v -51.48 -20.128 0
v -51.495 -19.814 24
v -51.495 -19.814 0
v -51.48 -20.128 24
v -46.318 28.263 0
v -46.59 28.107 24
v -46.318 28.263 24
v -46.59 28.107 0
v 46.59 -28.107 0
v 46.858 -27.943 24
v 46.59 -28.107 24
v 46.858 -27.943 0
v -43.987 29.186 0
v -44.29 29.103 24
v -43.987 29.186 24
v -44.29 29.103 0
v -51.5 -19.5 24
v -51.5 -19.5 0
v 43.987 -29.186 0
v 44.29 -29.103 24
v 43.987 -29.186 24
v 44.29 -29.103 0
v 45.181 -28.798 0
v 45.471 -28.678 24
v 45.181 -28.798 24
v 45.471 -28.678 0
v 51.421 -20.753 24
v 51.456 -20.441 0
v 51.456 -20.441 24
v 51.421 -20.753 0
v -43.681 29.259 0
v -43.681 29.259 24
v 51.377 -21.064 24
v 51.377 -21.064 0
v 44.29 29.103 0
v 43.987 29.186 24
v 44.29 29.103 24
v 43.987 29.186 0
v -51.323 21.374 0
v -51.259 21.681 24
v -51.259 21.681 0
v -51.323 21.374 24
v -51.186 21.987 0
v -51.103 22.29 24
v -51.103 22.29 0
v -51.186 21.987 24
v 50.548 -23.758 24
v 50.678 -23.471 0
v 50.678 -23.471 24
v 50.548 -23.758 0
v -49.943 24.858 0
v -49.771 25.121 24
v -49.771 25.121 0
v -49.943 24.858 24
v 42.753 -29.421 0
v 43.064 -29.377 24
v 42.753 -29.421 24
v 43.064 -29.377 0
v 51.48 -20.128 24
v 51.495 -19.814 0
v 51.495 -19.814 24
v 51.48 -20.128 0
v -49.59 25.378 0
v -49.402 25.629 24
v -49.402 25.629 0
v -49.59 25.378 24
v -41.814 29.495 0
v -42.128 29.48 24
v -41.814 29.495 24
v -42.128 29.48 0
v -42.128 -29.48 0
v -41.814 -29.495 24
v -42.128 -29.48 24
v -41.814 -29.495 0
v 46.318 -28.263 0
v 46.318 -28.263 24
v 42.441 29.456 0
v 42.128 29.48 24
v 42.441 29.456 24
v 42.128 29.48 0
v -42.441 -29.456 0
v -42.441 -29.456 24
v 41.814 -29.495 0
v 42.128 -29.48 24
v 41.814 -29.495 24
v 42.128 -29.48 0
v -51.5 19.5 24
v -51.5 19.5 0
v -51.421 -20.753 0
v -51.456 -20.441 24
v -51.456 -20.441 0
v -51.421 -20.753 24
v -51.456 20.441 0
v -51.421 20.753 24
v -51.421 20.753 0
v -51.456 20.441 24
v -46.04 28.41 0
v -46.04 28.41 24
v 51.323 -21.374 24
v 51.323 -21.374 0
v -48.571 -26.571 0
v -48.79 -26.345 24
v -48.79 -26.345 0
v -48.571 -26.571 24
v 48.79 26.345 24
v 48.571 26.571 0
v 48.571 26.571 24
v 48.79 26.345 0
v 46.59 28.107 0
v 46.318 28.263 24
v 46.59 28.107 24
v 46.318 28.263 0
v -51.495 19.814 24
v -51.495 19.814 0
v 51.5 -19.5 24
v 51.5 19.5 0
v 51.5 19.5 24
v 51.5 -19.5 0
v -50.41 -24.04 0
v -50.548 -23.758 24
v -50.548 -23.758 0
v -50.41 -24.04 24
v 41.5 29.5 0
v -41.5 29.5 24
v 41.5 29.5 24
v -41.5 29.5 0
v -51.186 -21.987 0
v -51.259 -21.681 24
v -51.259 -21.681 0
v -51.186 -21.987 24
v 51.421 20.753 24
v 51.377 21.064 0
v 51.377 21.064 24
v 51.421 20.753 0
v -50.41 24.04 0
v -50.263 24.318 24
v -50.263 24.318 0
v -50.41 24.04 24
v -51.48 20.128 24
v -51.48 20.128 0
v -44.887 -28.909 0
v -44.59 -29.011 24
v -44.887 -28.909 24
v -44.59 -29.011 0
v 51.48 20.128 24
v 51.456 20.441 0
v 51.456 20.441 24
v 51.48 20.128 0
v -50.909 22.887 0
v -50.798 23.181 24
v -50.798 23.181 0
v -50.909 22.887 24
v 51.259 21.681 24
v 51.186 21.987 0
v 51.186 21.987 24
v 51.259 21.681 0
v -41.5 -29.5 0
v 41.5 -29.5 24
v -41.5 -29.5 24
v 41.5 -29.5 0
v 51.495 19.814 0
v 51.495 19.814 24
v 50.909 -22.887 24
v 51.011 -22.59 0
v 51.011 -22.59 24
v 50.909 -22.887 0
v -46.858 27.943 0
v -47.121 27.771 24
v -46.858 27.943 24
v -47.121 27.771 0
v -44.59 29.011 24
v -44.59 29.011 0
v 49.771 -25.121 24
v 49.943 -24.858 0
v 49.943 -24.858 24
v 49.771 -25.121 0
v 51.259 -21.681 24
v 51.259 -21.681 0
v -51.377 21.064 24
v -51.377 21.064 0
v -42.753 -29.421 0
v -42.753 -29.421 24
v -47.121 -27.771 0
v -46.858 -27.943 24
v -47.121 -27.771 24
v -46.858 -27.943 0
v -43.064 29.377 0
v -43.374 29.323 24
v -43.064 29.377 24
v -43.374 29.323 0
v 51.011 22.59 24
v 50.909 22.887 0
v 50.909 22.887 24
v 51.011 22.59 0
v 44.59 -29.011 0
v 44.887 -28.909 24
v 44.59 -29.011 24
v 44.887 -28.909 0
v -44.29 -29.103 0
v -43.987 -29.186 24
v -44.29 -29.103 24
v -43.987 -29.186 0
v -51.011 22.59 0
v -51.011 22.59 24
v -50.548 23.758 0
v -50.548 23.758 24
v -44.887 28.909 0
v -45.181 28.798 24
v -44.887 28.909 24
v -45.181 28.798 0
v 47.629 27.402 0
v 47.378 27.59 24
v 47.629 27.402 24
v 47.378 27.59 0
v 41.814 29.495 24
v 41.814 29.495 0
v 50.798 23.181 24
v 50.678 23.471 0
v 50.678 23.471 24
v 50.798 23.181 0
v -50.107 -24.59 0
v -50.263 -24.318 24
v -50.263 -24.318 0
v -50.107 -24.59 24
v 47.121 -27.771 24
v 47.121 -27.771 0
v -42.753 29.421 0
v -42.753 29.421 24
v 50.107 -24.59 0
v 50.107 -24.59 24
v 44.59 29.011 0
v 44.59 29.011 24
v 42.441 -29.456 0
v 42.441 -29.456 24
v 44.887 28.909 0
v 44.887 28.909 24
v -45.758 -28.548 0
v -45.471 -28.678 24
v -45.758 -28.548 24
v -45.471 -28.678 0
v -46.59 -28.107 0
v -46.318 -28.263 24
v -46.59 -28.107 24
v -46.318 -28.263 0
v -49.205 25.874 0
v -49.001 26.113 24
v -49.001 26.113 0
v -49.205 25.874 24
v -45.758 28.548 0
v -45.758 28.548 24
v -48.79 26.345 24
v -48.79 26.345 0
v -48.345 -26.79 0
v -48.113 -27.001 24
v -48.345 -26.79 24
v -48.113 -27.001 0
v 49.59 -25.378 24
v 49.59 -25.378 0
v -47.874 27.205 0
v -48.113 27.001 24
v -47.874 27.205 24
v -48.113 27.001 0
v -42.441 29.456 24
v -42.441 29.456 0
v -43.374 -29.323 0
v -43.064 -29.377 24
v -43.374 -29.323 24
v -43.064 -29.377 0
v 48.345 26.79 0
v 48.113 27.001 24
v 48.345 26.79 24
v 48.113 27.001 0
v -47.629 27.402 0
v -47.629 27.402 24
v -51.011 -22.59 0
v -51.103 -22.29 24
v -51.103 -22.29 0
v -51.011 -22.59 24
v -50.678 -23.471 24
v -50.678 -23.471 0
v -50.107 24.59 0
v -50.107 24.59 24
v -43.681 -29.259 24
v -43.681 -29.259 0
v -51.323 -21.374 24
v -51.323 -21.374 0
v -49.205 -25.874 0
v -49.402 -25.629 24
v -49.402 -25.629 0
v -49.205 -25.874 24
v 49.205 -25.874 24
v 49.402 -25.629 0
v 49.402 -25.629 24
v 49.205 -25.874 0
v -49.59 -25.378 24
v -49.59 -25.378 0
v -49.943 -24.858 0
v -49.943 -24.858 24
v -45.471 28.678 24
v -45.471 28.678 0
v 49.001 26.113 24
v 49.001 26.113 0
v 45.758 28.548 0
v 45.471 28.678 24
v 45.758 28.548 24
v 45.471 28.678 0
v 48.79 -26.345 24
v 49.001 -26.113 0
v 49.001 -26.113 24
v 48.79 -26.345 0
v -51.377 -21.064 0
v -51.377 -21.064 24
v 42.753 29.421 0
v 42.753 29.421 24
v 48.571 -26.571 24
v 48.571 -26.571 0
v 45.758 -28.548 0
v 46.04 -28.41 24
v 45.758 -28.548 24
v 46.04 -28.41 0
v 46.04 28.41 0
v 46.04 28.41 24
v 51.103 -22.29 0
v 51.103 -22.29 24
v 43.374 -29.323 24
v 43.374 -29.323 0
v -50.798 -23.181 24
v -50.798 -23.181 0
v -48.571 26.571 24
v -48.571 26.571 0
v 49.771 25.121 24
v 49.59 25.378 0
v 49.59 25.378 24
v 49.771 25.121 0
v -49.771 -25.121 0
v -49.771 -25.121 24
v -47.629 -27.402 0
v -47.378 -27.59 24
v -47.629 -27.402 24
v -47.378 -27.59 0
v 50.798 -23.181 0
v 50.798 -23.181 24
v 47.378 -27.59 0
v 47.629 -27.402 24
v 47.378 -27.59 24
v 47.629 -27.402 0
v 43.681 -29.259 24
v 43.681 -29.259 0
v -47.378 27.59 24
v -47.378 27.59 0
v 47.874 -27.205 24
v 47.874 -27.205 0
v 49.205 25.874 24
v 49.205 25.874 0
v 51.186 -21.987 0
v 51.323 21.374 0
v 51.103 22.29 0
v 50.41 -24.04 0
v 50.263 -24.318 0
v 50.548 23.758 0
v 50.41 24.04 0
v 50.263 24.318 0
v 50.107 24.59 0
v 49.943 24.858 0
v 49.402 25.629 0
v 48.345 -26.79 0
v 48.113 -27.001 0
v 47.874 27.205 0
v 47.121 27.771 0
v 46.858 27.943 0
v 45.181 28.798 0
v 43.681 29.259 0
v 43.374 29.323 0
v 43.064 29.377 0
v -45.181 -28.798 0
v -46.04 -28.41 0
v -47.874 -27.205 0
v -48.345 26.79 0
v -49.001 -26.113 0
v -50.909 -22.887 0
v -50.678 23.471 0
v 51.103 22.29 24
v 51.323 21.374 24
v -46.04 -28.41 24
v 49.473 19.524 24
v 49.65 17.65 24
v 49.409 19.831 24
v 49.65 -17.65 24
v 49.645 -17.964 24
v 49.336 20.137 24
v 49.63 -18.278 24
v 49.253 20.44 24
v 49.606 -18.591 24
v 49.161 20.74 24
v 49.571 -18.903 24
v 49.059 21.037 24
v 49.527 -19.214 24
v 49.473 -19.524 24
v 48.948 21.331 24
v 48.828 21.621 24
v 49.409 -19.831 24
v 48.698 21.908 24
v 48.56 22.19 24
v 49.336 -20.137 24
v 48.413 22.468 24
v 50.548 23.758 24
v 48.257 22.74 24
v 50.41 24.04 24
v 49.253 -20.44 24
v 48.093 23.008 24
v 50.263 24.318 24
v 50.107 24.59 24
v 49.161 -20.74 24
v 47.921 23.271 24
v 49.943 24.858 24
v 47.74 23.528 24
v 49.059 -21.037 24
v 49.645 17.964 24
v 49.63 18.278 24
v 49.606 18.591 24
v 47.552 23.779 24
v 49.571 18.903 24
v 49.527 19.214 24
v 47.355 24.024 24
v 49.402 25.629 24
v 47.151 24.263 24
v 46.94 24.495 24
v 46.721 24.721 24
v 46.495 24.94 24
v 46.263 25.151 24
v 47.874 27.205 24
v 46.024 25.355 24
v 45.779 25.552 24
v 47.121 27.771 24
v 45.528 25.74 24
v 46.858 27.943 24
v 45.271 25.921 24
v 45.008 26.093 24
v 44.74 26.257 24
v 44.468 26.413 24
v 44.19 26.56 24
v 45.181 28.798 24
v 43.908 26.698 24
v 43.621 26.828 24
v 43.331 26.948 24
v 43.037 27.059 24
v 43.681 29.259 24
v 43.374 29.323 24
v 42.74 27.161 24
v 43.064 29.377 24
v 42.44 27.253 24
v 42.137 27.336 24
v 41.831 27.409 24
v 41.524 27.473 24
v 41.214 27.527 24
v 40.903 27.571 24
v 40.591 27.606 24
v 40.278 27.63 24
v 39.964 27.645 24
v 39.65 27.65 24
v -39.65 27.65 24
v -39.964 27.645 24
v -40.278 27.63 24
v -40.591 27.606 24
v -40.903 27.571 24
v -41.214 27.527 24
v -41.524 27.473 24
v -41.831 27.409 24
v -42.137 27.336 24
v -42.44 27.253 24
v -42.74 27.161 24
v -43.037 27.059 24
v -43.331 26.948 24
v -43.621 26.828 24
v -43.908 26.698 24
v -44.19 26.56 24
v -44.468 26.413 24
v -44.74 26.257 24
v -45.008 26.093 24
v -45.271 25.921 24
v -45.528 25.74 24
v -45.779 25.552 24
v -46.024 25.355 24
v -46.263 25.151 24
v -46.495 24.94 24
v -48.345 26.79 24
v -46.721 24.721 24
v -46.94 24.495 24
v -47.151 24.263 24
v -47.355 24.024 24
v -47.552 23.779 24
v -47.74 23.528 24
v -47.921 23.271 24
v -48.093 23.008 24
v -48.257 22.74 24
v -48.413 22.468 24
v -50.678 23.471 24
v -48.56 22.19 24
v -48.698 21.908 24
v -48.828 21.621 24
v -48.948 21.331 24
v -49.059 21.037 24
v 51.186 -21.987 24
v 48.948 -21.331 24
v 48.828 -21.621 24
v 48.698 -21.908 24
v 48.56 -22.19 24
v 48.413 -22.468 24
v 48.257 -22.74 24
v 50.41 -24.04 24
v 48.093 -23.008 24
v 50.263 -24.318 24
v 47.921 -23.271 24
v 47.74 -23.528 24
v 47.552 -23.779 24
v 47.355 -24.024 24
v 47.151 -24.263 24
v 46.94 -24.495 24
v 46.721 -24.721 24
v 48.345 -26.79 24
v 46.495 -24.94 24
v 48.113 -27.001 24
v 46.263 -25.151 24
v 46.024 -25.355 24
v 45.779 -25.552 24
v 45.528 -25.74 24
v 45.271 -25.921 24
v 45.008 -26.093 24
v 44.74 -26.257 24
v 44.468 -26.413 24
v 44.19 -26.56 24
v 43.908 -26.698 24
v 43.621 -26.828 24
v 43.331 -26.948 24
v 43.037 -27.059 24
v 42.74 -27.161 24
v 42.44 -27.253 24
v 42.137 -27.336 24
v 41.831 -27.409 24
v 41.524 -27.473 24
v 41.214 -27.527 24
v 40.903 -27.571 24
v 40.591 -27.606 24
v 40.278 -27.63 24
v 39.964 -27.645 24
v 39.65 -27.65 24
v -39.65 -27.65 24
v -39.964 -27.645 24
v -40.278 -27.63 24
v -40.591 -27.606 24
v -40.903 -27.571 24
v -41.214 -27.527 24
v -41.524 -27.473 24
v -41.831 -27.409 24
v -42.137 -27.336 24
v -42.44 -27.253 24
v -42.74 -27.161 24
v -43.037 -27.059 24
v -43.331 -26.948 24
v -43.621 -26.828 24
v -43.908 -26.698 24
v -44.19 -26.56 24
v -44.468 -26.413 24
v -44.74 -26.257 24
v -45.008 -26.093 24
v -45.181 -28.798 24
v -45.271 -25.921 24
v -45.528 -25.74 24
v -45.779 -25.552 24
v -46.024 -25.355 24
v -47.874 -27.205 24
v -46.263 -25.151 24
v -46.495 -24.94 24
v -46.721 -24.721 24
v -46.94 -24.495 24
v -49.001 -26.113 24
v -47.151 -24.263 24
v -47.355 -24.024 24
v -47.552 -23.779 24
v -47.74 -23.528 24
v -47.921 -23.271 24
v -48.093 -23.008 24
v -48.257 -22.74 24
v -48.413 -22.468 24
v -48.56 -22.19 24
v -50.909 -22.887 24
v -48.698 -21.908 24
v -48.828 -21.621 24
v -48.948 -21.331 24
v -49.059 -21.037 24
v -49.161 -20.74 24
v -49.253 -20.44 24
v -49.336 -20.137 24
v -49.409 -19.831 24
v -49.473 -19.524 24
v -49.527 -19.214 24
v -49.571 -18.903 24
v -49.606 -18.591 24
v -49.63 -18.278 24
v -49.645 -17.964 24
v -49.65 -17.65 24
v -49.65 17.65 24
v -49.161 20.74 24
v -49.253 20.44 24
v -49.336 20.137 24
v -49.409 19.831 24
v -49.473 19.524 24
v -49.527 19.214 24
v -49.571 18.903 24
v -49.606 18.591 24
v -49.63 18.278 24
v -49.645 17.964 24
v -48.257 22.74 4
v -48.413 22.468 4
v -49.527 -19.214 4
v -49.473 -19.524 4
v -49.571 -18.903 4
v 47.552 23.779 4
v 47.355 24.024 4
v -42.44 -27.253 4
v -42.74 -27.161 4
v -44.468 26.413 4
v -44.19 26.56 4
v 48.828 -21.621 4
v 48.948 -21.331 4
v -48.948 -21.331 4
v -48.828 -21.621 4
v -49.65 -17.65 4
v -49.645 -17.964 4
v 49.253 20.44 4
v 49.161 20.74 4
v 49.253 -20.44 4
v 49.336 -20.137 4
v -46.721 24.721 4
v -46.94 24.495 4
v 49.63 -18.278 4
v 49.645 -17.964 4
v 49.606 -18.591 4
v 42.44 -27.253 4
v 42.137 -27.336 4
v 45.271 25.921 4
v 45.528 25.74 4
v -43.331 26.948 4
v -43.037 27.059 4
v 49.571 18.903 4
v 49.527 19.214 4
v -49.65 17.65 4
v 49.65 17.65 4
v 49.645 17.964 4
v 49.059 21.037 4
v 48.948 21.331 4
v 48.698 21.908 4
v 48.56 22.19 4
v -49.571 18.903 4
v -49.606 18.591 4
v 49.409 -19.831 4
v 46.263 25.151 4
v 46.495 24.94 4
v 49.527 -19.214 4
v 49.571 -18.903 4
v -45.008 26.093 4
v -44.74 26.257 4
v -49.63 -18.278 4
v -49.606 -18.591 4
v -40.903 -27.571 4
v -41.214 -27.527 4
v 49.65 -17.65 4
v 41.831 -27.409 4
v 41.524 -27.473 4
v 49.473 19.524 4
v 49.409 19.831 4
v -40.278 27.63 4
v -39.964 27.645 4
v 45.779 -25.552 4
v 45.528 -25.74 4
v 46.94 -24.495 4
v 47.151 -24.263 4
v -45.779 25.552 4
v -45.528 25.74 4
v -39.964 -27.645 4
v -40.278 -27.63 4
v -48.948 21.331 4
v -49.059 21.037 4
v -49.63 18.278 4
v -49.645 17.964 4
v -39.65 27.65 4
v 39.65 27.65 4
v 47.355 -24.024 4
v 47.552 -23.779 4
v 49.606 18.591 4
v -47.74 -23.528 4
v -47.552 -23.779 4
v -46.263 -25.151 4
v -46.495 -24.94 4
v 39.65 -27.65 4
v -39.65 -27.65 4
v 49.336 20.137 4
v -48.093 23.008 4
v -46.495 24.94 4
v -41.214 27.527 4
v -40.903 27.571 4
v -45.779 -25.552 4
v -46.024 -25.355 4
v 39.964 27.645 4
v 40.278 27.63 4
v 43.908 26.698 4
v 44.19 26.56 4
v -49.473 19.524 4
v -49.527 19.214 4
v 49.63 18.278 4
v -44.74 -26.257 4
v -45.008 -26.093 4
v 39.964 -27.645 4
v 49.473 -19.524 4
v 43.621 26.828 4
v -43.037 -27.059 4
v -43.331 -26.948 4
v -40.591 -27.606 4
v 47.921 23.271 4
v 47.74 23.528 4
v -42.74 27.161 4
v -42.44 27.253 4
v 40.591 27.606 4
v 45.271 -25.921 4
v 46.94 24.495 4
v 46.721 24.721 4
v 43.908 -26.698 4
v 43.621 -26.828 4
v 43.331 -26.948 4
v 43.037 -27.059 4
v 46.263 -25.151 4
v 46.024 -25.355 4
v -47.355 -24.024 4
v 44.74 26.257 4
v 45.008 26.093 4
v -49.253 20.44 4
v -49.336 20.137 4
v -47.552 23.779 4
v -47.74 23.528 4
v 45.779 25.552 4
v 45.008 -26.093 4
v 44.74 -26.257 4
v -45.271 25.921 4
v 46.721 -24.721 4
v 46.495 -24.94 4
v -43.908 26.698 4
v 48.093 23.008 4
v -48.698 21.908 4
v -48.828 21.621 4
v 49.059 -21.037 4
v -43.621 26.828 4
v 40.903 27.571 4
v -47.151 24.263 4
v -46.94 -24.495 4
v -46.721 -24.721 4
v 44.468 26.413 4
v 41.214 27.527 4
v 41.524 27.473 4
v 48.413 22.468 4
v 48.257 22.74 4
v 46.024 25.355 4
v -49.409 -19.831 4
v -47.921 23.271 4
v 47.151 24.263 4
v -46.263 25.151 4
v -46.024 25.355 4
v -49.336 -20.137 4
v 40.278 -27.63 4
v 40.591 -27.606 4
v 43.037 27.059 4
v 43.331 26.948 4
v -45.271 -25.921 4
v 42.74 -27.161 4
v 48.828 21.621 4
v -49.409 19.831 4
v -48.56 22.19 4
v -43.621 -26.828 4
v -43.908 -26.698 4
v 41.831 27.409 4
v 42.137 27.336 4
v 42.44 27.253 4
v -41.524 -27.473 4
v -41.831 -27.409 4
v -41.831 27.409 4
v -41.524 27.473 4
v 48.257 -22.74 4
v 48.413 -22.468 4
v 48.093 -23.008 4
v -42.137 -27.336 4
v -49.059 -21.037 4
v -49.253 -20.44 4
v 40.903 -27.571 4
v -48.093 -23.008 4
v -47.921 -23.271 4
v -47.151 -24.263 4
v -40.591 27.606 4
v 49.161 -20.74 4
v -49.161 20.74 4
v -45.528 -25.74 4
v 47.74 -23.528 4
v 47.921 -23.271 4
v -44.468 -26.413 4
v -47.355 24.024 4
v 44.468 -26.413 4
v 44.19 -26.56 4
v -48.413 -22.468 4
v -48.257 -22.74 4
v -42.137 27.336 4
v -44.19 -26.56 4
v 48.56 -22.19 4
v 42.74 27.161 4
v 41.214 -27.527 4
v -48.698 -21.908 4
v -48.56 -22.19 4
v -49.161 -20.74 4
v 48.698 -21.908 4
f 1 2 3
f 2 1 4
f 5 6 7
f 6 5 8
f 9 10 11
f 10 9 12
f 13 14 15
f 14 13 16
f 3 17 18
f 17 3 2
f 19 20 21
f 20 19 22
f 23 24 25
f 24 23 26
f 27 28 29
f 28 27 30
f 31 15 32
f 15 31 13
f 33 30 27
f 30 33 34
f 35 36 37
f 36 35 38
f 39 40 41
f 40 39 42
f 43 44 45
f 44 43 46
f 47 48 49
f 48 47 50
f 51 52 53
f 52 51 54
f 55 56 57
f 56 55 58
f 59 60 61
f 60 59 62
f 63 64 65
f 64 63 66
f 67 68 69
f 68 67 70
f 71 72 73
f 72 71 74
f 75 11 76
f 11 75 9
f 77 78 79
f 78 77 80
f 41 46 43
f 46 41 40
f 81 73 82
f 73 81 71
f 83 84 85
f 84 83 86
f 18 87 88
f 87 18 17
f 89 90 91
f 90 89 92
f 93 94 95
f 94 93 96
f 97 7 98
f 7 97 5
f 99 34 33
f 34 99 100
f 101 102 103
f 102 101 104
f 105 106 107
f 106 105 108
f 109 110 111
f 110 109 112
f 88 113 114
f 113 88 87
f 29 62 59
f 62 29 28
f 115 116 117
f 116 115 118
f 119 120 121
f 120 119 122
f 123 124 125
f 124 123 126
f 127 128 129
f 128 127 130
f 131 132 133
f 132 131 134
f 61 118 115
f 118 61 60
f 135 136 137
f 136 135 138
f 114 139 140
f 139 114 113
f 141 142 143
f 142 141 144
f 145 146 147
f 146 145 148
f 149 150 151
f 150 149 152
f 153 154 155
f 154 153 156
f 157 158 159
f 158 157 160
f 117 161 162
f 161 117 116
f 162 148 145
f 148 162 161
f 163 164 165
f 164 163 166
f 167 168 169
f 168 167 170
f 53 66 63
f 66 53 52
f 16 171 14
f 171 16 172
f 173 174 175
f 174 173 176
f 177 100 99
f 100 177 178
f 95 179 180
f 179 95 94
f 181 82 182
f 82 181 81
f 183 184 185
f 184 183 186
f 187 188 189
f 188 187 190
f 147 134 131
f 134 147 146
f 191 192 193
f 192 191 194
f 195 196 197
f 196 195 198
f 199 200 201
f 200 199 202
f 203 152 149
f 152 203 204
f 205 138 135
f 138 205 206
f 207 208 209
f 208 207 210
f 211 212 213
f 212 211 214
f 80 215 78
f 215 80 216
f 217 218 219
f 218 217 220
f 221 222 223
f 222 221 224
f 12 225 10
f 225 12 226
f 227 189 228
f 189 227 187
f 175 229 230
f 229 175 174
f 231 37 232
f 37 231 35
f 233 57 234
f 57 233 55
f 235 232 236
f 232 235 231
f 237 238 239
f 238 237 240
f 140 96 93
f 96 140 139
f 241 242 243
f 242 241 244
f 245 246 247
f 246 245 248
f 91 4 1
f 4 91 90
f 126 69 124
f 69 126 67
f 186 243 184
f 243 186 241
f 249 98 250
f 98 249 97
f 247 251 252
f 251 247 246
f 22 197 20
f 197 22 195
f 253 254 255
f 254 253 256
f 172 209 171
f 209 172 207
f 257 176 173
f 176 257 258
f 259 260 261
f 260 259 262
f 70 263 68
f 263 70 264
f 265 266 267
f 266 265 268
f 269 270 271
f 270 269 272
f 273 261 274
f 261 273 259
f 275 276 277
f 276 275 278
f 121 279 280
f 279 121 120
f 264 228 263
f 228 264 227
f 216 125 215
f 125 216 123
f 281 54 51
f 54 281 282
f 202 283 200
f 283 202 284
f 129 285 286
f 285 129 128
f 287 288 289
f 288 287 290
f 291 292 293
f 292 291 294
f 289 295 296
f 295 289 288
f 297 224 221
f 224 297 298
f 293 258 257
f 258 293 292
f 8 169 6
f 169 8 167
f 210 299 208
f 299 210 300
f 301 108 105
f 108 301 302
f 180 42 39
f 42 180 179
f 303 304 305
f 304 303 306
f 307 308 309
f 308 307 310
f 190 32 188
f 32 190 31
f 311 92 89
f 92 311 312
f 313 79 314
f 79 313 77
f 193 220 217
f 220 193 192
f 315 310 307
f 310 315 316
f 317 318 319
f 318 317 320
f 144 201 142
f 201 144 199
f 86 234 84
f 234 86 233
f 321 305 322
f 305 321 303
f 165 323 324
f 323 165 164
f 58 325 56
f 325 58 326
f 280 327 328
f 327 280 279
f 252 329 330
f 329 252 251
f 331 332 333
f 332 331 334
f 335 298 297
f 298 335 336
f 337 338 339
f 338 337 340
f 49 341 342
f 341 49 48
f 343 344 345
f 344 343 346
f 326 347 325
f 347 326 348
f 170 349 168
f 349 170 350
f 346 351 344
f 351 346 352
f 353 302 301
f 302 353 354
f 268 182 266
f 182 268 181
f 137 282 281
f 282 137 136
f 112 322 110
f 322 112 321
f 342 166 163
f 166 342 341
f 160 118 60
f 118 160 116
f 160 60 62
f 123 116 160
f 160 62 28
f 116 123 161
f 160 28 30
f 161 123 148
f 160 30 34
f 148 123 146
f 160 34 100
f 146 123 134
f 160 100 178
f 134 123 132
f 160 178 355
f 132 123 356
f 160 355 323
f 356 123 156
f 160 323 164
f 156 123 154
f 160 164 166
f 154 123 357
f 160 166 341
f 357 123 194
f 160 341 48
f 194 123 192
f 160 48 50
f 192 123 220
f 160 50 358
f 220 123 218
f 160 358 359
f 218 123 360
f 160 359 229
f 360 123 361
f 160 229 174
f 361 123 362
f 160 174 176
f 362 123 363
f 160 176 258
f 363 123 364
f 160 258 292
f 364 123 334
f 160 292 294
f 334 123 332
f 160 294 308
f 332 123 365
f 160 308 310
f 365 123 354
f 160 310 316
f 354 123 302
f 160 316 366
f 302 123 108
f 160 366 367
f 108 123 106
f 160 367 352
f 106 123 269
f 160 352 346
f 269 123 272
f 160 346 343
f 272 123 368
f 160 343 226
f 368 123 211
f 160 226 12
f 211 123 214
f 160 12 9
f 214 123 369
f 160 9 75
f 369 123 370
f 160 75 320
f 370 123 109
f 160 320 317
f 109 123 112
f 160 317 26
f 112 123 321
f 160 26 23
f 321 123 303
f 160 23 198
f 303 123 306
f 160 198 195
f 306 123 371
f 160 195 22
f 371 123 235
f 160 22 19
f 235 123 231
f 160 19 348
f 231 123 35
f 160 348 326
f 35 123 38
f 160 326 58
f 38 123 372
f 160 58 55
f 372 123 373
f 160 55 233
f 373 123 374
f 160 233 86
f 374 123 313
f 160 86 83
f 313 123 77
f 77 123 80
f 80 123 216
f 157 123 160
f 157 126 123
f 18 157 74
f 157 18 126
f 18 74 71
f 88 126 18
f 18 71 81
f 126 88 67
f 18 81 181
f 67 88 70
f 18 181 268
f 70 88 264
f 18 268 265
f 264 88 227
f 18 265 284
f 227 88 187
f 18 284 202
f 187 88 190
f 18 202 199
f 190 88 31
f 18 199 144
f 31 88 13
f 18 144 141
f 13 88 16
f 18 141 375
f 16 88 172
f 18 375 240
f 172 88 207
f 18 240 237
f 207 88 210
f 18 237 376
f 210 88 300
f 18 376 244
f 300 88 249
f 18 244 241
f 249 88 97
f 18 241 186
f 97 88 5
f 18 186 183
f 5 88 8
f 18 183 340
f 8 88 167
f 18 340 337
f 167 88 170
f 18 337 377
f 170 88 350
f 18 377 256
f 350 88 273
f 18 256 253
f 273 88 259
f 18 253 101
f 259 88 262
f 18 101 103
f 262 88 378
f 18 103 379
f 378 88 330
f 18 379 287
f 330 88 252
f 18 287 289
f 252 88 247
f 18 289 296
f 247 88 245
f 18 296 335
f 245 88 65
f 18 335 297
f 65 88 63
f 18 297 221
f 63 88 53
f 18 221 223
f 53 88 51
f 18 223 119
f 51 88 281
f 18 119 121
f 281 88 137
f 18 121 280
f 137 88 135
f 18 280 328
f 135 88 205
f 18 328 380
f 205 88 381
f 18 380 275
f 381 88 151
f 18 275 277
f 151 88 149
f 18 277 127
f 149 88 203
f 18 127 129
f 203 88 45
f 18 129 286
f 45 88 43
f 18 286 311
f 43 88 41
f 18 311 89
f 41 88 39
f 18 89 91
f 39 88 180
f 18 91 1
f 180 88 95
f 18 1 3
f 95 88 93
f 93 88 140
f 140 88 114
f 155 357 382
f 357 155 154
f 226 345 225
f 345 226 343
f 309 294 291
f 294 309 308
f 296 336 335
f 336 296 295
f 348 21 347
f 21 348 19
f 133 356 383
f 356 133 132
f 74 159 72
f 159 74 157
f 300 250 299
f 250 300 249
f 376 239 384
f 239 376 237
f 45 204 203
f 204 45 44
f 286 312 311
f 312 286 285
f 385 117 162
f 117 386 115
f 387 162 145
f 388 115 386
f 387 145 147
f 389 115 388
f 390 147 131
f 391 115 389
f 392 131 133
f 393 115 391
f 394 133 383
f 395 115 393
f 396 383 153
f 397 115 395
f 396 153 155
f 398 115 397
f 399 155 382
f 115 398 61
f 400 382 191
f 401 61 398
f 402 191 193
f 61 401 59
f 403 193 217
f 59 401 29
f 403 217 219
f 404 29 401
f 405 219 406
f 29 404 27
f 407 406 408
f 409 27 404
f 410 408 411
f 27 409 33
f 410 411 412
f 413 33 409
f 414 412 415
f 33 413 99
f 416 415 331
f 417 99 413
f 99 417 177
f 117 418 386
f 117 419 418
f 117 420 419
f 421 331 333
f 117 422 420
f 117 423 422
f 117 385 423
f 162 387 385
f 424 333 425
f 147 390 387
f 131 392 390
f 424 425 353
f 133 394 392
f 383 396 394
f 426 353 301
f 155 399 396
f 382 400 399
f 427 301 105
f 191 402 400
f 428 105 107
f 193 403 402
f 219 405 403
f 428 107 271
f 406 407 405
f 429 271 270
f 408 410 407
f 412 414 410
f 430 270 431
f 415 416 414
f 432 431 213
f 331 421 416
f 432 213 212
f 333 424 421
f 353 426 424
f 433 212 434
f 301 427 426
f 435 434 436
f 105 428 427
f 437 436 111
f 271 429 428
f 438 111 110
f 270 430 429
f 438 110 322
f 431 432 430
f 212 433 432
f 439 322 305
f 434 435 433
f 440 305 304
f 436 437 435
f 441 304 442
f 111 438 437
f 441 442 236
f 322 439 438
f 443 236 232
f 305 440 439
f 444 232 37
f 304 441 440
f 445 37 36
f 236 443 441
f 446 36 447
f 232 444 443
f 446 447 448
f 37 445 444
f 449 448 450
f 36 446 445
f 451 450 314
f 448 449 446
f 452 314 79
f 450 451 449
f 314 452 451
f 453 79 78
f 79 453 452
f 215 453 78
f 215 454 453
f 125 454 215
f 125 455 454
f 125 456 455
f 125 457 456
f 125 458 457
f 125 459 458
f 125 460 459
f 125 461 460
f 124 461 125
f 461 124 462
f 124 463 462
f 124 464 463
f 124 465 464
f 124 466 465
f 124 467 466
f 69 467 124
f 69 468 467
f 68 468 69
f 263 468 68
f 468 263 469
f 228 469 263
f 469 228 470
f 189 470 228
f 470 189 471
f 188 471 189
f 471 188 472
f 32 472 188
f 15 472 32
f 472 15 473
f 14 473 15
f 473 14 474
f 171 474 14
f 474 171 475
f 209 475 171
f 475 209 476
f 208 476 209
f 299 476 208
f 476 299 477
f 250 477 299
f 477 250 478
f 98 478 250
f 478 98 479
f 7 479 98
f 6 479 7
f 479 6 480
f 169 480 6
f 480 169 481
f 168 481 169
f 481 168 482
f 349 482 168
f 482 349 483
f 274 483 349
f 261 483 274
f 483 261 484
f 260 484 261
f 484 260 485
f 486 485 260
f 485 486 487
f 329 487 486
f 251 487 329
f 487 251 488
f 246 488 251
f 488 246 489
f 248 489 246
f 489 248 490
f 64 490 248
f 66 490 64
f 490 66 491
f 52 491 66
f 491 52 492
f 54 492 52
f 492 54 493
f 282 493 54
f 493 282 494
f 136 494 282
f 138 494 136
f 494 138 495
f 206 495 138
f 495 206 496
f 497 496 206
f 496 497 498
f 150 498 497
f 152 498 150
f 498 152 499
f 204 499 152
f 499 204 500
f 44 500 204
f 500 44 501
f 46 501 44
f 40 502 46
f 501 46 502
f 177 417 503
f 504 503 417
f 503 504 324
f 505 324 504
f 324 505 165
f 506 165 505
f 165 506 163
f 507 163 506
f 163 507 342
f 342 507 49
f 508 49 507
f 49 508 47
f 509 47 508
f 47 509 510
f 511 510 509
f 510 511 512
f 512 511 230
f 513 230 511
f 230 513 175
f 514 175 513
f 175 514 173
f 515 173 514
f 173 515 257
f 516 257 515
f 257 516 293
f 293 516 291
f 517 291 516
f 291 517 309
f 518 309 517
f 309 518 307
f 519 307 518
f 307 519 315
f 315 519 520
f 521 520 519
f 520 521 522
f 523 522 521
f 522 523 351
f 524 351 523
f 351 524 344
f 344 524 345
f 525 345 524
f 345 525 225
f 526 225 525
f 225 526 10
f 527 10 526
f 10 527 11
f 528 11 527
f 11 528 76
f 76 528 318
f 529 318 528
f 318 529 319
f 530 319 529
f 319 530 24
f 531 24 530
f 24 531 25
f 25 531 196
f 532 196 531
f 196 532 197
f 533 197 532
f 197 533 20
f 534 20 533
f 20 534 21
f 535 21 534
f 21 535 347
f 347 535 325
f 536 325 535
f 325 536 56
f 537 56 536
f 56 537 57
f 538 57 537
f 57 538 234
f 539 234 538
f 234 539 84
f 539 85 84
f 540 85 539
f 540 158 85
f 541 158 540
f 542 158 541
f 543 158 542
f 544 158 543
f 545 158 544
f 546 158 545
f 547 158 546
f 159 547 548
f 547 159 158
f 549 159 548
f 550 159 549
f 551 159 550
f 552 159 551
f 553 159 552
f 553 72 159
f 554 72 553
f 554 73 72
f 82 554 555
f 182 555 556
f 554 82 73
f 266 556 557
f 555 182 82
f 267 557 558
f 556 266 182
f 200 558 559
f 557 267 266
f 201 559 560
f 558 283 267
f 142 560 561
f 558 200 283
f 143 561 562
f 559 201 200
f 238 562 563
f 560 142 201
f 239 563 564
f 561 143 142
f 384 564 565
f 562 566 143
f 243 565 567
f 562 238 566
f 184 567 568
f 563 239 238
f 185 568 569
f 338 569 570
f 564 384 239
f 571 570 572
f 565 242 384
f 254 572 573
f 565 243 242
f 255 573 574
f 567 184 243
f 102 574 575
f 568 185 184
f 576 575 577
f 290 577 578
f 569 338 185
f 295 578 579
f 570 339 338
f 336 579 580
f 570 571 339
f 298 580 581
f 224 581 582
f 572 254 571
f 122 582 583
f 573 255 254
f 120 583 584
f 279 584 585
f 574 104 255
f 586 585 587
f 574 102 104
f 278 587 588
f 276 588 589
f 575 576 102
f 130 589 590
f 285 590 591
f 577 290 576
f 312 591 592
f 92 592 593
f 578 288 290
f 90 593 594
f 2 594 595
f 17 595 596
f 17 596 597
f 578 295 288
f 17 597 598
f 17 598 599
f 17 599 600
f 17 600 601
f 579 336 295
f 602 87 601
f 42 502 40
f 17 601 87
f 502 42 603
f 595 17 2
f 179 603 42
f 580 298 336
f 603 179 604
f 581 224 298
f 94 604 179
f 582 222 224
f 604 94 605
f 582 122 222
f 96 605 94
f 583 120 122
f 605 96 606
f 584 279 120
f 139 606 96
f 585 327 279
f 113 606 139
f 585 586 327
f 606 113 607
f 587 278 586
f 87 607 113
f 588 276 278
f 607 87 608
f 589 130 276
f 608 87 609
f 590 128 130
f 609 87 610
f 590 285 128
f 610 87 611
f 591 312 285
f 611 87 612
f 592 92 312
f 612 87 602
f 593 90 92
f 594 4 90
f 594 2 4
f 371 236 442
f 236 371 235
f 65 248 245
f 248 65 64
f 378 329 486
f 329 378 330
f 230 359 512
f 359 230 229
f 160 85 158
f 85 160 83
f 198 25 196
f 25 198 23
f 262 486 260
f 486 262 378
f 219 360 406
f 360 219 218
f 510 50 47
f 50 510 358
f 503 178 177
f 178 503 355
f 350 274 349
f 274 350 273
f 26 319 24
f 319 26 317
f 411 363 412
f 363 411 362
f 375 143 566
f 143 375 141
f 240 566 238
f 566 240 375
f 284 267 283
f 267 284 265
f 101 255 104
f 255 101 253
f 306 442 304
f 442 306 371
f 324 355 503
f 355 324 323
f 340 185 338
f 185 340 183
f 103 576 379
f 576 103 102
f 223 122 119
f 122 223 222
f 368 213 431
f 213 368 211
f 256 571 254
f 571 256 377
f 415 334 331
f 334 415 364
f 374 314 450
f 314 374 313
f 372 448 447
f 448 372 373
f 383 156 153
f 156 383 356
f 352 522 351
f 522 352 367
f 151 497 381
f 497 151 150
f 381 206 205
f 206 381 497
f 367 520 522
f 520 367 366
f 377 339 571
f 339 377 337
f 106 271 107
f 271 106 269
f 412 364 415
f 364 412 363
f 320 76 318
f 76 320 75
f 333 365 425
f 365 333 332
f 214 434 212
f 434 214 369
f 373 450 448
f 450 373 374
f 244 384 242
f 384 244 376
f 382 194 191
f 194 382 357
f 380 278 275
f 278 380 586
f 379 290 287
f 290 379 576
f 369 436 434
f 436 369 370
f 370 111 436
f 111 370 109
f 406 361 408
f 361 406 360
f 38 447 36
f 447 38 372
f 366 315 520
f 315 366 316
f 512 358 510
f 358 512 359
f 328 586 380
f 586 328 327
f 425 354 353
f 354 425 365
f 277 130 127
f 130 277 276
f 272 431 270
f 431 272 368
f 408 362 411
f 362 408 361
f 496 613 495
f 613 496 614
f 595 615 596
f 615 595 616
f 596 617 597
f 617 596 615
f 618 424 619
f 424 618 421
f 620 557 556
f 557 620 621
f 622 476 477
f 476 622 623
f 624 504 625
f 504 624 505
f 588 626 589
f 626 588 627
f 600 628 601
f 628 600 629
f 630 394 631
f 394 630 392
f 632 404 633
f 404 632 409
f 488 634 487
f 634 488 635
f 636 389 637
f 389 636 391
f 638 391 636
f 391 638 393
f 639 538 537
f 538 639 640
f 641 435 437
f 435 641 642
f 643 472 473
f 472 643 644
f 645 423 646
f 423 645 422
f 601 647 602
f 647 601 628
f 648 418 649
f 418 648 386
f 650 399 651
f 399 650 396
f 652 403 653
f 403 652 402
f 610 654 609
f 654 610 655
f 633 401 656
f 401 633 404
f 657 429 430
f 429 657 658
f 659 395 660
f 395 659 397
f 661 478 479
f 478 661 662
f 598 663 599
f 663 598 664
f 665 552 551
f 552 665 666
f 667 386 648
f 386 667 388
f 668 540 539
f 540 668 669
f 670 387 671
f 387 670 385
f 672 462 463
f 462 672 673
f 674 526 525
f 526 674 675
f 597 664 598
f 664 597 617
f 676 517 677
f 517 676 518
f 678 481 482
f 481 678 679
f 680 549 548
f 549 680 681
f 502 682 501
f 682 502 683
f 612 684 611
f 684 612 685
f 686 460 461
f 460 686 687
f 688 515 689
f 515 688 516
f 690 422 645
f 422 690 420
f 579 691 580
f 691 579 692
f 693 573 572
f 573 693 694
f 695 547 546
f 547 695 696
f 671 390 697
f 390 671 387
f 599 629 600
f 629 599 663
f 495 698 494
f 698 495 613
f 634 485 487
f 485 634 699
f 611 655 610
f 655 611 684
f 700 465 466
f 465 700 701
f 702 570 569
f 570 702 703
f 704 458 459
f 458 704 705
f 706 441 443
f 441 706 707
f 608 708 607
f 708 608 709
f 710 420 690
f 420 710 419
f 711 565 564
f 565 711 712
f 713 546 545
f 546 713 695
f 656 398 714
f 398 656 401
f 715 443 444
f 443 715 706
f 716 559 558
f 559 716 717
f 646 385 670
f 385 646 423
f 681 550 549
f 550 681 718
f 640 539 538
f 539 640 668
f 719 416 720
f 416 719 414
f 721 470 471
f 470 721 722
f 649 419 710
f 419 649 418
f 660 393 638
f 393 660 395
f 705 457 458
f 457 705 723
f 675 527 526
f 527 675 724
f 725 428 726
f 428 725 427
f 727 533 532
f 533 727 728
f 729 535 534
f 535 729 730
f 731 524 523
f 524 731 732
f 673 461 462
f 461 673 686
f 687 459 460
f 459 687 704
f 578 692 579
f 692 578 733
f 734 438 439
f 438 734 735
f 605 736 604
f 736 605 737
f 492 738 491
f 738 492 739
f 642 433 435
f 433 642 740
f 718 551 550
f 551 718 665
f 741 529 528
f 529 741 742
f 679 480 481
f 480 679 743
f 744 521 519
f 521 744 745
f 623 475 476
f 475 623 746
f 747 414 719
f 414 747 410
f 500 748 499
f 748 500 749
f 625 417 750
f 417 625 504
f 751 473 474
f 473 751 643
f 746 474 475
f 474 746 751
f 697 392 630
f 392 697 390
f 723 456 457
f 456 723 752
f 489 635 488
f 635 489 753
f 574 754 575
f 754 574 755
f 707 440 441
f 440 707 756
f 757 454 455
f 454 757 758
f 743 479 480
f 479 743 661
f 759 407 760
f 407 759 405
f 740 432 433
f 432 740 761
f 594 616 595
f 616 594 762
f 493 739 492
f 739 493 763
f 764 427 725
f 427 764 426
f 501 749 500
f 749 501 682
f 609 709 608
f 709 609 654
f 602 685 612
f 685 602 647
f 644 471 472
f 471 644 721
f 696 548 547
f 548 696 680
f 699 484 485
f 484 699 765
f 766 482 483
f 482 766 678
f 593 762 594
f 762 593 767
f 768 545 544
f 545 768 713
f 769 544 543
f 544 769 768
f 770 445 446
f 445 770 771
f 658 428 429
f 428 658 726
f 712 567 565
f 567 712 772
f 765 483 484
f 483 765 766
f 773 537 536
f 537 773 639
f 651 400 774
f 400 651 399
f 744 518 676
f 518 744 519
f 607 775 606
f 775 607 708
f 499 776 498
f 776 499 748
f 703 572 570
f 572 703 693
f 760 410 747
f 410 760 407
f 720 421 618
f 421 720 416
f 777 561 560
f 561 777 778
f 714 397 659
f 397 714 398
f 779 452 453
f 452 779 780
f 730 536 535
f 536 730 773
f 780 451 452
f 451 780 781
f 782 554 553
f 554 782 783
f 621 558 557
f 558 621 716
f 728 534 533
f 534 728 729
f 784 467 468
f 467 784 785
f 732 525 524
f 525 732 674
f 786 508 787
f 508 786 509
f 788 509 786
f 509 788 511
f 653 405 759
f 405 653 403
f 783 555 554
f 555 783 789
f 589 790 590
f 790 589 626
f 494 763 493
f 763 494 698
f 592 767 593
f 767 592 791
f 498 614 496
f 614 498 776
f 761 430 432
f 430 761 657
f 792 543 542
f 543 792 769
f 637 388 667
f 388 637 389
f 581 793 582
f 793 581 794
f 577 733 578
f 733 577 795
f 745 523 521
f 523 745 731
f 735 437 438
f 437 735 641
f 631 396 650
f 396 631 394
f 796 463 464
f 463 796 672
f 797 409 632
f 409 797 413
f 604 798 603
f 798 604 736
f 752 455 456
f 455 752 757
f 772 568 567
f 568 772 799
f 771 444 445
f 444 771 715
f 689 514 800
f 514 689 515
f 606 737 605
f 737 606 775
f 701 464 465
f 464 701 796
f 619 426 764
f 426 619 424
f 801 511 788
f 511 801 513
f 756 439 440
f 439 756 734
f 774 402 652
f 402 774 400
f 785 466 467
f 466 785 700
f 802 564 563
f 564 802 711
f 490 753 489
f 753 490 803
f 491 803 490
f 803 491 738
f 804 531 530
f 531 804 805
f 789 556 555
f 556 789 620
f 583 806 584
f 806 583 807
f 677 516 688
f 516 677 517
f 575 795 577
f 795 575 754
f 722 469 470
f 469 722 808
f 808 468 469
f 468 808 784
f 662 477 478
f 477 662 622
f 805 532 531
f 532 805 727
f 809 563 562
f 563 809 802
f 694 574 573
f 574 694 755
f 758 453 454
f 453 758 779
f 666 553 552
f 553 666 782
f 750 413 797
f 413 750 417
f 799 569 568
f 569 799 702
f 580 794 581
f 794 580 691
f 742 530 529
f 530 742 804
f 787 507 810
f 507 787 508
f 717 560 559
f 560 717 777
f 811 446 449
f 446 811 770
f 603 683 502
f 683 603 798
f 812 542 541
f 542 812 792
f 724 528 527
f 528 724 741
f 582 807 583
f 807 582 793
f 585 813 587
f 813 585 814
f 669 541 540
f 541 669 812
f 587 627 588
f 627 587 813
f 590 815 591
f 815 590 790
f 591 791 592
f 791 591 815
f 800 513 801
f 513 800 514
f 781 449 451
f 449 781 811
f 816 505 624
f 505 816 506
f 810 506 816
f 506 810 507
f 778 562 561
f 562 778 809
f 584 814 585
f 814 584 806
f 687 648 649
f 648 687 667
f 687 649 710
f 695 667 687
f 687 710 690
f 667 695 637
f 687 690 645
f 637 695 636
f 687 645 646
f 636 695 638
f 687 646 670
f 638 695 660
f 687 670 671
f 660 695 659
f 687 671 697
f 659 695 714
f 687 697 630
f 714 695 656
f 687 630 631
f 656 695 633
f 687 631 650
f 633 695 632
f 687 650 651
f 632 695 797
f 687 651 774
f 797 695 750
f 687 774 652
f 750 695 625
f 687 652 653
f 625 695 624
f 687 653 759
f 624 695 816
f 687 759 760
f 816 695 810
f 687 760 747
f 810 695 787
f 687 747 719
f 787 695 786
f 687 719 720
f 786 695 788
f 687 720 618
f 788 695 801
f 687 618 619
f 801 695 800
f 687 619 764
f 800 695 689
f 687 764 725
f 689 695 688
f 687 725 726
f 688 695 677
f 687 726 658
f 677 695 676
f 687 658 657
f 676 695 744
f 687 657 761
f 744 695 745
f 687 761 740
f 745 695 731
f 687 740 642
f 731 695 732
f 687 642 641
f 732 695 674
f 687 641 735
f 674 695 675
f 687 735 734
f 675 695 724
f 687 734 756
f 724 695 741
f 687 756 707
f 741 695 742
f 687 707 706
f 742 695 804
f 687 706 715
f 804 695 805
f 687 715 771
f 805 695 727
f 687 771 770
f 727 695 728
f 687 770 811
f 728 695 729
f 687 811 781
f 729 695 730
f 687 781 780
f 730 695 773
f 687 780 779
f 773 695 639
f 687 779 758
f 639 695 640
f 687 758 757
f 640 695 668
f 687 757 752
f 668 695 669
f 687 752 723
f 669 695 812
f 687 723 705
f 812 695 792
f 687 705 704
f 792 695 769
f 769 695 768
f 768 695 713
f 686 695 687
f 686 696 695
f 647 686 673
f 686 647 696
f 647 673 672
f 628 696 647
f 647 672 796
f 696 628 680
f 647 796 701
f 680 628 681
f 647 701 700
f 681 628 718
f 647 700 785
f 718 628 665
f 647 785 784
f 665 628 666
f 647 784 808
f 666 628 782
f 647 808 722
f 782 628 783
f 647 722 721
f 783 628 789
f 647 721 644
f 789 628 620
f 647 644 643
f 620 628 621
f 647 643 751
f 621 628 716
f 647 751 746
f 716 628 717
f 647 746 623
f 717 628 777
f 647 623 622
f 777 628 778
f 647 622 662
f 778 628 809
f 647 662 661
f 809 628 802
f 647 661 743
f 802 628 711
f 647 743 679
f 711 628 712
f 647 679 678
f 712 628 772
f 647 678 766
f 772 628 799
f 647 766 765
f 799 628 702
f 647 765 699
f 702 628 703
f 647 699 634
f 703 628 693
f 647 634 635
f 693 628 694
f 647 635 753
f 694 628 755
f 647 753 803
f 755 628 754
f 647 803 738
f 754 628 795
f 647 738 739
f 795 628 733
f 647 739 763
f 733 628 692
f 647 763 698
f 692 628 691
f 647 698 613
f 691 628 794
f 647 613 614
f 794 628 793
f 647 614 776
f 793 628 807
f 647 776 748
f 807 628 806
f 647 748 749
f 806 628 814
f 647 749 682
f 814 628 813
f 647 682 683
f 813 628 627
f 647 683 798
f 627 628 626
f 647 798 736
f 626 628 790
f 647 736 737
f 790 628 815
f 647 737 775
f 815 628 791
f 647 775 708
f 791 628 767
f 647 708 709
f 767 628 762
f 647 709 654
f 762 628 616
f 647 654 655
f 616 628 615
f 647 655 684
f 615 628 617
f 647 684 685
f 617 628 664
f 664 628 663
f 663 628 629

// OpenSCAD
board_x = 95;
board_y = 94;
board_h = 7;

module graflex_container() {
    translate([0, 0, board_y/2])
        cube([board_x, board_h, board_y], center = true);
}
module rounded_box(x, y, h, r){
    ext_x = (x - 2*r)/2;
    ext_y = (y - 2*r)/2;
    linear_extrude(height = h, twist = 0) {
        difference() {
            hull() {
                translate([ext_x, ext_y,0]) circle(r=r);
                translate([ext_x, -ext_y,0]) circle(r=r);
                translate([-ext_x, ext_y,0]) circle(r=r);
                translate([-ext_x, -ext_y,0]) circle(r=r);
            }
        }
    }
}

module container(front, back, number) {
    wall = 4;
    int_wall = wall/2;
    cap_h = 20;
    ext_y = front+board_h+back+wall*2+2*int_wall;
    difference()  {
        translate([0, ext_y/2, 0]) {
            union() {
                rounded_box(board_x+wall*2, ext_y, board_y+wall - cap_h, 10);
                rounded_box(board_x+wall, ext_y-wall, board_y+wall, 10);
            }
        }
        translate([0, front/2 + wall, wall]) {
            rounded_box(board_x, front, board_y, 10);
        }
        
        translate([0, front + wall + int_wall + board_h/2, wall]) {
            graflex_container();
        }
        translate([0, front + wall + int_wall + board_h/2, wall+board_y/2]) {
            cube([board_x-20, board_h+2*int_wall, board_y], center = true);
        }
        translate([0, front + wall + int_wall + board_h + int_wall + back/2, wall]) {
            rounded_box(board_x, back, board_y, 5);
        }
    }
}

module container_cap(front, back, number) {
    wall = 4;
    int_wall = wall/2;
    cap_h = 20;
    ext_y = front+board_h+back+wall*2+2*int_wall;
    difference()  {
            rounded_box(board_x+wall*2, ext_y, cap_h + wall, 10);
            translate([0, 0, wall]) {
                rounded_box(board_x+wall+0.3, ext_y-wall+0.3, cap_h , 10);
            }
    }
}

$fn= 200;
//$fa = 100;
//lens_board(80);
//graflex_container();
//holder_low();
//holder_high();
//graflex_container();

//container(30, 10, 160);
container_cap(30, 10, 160);
